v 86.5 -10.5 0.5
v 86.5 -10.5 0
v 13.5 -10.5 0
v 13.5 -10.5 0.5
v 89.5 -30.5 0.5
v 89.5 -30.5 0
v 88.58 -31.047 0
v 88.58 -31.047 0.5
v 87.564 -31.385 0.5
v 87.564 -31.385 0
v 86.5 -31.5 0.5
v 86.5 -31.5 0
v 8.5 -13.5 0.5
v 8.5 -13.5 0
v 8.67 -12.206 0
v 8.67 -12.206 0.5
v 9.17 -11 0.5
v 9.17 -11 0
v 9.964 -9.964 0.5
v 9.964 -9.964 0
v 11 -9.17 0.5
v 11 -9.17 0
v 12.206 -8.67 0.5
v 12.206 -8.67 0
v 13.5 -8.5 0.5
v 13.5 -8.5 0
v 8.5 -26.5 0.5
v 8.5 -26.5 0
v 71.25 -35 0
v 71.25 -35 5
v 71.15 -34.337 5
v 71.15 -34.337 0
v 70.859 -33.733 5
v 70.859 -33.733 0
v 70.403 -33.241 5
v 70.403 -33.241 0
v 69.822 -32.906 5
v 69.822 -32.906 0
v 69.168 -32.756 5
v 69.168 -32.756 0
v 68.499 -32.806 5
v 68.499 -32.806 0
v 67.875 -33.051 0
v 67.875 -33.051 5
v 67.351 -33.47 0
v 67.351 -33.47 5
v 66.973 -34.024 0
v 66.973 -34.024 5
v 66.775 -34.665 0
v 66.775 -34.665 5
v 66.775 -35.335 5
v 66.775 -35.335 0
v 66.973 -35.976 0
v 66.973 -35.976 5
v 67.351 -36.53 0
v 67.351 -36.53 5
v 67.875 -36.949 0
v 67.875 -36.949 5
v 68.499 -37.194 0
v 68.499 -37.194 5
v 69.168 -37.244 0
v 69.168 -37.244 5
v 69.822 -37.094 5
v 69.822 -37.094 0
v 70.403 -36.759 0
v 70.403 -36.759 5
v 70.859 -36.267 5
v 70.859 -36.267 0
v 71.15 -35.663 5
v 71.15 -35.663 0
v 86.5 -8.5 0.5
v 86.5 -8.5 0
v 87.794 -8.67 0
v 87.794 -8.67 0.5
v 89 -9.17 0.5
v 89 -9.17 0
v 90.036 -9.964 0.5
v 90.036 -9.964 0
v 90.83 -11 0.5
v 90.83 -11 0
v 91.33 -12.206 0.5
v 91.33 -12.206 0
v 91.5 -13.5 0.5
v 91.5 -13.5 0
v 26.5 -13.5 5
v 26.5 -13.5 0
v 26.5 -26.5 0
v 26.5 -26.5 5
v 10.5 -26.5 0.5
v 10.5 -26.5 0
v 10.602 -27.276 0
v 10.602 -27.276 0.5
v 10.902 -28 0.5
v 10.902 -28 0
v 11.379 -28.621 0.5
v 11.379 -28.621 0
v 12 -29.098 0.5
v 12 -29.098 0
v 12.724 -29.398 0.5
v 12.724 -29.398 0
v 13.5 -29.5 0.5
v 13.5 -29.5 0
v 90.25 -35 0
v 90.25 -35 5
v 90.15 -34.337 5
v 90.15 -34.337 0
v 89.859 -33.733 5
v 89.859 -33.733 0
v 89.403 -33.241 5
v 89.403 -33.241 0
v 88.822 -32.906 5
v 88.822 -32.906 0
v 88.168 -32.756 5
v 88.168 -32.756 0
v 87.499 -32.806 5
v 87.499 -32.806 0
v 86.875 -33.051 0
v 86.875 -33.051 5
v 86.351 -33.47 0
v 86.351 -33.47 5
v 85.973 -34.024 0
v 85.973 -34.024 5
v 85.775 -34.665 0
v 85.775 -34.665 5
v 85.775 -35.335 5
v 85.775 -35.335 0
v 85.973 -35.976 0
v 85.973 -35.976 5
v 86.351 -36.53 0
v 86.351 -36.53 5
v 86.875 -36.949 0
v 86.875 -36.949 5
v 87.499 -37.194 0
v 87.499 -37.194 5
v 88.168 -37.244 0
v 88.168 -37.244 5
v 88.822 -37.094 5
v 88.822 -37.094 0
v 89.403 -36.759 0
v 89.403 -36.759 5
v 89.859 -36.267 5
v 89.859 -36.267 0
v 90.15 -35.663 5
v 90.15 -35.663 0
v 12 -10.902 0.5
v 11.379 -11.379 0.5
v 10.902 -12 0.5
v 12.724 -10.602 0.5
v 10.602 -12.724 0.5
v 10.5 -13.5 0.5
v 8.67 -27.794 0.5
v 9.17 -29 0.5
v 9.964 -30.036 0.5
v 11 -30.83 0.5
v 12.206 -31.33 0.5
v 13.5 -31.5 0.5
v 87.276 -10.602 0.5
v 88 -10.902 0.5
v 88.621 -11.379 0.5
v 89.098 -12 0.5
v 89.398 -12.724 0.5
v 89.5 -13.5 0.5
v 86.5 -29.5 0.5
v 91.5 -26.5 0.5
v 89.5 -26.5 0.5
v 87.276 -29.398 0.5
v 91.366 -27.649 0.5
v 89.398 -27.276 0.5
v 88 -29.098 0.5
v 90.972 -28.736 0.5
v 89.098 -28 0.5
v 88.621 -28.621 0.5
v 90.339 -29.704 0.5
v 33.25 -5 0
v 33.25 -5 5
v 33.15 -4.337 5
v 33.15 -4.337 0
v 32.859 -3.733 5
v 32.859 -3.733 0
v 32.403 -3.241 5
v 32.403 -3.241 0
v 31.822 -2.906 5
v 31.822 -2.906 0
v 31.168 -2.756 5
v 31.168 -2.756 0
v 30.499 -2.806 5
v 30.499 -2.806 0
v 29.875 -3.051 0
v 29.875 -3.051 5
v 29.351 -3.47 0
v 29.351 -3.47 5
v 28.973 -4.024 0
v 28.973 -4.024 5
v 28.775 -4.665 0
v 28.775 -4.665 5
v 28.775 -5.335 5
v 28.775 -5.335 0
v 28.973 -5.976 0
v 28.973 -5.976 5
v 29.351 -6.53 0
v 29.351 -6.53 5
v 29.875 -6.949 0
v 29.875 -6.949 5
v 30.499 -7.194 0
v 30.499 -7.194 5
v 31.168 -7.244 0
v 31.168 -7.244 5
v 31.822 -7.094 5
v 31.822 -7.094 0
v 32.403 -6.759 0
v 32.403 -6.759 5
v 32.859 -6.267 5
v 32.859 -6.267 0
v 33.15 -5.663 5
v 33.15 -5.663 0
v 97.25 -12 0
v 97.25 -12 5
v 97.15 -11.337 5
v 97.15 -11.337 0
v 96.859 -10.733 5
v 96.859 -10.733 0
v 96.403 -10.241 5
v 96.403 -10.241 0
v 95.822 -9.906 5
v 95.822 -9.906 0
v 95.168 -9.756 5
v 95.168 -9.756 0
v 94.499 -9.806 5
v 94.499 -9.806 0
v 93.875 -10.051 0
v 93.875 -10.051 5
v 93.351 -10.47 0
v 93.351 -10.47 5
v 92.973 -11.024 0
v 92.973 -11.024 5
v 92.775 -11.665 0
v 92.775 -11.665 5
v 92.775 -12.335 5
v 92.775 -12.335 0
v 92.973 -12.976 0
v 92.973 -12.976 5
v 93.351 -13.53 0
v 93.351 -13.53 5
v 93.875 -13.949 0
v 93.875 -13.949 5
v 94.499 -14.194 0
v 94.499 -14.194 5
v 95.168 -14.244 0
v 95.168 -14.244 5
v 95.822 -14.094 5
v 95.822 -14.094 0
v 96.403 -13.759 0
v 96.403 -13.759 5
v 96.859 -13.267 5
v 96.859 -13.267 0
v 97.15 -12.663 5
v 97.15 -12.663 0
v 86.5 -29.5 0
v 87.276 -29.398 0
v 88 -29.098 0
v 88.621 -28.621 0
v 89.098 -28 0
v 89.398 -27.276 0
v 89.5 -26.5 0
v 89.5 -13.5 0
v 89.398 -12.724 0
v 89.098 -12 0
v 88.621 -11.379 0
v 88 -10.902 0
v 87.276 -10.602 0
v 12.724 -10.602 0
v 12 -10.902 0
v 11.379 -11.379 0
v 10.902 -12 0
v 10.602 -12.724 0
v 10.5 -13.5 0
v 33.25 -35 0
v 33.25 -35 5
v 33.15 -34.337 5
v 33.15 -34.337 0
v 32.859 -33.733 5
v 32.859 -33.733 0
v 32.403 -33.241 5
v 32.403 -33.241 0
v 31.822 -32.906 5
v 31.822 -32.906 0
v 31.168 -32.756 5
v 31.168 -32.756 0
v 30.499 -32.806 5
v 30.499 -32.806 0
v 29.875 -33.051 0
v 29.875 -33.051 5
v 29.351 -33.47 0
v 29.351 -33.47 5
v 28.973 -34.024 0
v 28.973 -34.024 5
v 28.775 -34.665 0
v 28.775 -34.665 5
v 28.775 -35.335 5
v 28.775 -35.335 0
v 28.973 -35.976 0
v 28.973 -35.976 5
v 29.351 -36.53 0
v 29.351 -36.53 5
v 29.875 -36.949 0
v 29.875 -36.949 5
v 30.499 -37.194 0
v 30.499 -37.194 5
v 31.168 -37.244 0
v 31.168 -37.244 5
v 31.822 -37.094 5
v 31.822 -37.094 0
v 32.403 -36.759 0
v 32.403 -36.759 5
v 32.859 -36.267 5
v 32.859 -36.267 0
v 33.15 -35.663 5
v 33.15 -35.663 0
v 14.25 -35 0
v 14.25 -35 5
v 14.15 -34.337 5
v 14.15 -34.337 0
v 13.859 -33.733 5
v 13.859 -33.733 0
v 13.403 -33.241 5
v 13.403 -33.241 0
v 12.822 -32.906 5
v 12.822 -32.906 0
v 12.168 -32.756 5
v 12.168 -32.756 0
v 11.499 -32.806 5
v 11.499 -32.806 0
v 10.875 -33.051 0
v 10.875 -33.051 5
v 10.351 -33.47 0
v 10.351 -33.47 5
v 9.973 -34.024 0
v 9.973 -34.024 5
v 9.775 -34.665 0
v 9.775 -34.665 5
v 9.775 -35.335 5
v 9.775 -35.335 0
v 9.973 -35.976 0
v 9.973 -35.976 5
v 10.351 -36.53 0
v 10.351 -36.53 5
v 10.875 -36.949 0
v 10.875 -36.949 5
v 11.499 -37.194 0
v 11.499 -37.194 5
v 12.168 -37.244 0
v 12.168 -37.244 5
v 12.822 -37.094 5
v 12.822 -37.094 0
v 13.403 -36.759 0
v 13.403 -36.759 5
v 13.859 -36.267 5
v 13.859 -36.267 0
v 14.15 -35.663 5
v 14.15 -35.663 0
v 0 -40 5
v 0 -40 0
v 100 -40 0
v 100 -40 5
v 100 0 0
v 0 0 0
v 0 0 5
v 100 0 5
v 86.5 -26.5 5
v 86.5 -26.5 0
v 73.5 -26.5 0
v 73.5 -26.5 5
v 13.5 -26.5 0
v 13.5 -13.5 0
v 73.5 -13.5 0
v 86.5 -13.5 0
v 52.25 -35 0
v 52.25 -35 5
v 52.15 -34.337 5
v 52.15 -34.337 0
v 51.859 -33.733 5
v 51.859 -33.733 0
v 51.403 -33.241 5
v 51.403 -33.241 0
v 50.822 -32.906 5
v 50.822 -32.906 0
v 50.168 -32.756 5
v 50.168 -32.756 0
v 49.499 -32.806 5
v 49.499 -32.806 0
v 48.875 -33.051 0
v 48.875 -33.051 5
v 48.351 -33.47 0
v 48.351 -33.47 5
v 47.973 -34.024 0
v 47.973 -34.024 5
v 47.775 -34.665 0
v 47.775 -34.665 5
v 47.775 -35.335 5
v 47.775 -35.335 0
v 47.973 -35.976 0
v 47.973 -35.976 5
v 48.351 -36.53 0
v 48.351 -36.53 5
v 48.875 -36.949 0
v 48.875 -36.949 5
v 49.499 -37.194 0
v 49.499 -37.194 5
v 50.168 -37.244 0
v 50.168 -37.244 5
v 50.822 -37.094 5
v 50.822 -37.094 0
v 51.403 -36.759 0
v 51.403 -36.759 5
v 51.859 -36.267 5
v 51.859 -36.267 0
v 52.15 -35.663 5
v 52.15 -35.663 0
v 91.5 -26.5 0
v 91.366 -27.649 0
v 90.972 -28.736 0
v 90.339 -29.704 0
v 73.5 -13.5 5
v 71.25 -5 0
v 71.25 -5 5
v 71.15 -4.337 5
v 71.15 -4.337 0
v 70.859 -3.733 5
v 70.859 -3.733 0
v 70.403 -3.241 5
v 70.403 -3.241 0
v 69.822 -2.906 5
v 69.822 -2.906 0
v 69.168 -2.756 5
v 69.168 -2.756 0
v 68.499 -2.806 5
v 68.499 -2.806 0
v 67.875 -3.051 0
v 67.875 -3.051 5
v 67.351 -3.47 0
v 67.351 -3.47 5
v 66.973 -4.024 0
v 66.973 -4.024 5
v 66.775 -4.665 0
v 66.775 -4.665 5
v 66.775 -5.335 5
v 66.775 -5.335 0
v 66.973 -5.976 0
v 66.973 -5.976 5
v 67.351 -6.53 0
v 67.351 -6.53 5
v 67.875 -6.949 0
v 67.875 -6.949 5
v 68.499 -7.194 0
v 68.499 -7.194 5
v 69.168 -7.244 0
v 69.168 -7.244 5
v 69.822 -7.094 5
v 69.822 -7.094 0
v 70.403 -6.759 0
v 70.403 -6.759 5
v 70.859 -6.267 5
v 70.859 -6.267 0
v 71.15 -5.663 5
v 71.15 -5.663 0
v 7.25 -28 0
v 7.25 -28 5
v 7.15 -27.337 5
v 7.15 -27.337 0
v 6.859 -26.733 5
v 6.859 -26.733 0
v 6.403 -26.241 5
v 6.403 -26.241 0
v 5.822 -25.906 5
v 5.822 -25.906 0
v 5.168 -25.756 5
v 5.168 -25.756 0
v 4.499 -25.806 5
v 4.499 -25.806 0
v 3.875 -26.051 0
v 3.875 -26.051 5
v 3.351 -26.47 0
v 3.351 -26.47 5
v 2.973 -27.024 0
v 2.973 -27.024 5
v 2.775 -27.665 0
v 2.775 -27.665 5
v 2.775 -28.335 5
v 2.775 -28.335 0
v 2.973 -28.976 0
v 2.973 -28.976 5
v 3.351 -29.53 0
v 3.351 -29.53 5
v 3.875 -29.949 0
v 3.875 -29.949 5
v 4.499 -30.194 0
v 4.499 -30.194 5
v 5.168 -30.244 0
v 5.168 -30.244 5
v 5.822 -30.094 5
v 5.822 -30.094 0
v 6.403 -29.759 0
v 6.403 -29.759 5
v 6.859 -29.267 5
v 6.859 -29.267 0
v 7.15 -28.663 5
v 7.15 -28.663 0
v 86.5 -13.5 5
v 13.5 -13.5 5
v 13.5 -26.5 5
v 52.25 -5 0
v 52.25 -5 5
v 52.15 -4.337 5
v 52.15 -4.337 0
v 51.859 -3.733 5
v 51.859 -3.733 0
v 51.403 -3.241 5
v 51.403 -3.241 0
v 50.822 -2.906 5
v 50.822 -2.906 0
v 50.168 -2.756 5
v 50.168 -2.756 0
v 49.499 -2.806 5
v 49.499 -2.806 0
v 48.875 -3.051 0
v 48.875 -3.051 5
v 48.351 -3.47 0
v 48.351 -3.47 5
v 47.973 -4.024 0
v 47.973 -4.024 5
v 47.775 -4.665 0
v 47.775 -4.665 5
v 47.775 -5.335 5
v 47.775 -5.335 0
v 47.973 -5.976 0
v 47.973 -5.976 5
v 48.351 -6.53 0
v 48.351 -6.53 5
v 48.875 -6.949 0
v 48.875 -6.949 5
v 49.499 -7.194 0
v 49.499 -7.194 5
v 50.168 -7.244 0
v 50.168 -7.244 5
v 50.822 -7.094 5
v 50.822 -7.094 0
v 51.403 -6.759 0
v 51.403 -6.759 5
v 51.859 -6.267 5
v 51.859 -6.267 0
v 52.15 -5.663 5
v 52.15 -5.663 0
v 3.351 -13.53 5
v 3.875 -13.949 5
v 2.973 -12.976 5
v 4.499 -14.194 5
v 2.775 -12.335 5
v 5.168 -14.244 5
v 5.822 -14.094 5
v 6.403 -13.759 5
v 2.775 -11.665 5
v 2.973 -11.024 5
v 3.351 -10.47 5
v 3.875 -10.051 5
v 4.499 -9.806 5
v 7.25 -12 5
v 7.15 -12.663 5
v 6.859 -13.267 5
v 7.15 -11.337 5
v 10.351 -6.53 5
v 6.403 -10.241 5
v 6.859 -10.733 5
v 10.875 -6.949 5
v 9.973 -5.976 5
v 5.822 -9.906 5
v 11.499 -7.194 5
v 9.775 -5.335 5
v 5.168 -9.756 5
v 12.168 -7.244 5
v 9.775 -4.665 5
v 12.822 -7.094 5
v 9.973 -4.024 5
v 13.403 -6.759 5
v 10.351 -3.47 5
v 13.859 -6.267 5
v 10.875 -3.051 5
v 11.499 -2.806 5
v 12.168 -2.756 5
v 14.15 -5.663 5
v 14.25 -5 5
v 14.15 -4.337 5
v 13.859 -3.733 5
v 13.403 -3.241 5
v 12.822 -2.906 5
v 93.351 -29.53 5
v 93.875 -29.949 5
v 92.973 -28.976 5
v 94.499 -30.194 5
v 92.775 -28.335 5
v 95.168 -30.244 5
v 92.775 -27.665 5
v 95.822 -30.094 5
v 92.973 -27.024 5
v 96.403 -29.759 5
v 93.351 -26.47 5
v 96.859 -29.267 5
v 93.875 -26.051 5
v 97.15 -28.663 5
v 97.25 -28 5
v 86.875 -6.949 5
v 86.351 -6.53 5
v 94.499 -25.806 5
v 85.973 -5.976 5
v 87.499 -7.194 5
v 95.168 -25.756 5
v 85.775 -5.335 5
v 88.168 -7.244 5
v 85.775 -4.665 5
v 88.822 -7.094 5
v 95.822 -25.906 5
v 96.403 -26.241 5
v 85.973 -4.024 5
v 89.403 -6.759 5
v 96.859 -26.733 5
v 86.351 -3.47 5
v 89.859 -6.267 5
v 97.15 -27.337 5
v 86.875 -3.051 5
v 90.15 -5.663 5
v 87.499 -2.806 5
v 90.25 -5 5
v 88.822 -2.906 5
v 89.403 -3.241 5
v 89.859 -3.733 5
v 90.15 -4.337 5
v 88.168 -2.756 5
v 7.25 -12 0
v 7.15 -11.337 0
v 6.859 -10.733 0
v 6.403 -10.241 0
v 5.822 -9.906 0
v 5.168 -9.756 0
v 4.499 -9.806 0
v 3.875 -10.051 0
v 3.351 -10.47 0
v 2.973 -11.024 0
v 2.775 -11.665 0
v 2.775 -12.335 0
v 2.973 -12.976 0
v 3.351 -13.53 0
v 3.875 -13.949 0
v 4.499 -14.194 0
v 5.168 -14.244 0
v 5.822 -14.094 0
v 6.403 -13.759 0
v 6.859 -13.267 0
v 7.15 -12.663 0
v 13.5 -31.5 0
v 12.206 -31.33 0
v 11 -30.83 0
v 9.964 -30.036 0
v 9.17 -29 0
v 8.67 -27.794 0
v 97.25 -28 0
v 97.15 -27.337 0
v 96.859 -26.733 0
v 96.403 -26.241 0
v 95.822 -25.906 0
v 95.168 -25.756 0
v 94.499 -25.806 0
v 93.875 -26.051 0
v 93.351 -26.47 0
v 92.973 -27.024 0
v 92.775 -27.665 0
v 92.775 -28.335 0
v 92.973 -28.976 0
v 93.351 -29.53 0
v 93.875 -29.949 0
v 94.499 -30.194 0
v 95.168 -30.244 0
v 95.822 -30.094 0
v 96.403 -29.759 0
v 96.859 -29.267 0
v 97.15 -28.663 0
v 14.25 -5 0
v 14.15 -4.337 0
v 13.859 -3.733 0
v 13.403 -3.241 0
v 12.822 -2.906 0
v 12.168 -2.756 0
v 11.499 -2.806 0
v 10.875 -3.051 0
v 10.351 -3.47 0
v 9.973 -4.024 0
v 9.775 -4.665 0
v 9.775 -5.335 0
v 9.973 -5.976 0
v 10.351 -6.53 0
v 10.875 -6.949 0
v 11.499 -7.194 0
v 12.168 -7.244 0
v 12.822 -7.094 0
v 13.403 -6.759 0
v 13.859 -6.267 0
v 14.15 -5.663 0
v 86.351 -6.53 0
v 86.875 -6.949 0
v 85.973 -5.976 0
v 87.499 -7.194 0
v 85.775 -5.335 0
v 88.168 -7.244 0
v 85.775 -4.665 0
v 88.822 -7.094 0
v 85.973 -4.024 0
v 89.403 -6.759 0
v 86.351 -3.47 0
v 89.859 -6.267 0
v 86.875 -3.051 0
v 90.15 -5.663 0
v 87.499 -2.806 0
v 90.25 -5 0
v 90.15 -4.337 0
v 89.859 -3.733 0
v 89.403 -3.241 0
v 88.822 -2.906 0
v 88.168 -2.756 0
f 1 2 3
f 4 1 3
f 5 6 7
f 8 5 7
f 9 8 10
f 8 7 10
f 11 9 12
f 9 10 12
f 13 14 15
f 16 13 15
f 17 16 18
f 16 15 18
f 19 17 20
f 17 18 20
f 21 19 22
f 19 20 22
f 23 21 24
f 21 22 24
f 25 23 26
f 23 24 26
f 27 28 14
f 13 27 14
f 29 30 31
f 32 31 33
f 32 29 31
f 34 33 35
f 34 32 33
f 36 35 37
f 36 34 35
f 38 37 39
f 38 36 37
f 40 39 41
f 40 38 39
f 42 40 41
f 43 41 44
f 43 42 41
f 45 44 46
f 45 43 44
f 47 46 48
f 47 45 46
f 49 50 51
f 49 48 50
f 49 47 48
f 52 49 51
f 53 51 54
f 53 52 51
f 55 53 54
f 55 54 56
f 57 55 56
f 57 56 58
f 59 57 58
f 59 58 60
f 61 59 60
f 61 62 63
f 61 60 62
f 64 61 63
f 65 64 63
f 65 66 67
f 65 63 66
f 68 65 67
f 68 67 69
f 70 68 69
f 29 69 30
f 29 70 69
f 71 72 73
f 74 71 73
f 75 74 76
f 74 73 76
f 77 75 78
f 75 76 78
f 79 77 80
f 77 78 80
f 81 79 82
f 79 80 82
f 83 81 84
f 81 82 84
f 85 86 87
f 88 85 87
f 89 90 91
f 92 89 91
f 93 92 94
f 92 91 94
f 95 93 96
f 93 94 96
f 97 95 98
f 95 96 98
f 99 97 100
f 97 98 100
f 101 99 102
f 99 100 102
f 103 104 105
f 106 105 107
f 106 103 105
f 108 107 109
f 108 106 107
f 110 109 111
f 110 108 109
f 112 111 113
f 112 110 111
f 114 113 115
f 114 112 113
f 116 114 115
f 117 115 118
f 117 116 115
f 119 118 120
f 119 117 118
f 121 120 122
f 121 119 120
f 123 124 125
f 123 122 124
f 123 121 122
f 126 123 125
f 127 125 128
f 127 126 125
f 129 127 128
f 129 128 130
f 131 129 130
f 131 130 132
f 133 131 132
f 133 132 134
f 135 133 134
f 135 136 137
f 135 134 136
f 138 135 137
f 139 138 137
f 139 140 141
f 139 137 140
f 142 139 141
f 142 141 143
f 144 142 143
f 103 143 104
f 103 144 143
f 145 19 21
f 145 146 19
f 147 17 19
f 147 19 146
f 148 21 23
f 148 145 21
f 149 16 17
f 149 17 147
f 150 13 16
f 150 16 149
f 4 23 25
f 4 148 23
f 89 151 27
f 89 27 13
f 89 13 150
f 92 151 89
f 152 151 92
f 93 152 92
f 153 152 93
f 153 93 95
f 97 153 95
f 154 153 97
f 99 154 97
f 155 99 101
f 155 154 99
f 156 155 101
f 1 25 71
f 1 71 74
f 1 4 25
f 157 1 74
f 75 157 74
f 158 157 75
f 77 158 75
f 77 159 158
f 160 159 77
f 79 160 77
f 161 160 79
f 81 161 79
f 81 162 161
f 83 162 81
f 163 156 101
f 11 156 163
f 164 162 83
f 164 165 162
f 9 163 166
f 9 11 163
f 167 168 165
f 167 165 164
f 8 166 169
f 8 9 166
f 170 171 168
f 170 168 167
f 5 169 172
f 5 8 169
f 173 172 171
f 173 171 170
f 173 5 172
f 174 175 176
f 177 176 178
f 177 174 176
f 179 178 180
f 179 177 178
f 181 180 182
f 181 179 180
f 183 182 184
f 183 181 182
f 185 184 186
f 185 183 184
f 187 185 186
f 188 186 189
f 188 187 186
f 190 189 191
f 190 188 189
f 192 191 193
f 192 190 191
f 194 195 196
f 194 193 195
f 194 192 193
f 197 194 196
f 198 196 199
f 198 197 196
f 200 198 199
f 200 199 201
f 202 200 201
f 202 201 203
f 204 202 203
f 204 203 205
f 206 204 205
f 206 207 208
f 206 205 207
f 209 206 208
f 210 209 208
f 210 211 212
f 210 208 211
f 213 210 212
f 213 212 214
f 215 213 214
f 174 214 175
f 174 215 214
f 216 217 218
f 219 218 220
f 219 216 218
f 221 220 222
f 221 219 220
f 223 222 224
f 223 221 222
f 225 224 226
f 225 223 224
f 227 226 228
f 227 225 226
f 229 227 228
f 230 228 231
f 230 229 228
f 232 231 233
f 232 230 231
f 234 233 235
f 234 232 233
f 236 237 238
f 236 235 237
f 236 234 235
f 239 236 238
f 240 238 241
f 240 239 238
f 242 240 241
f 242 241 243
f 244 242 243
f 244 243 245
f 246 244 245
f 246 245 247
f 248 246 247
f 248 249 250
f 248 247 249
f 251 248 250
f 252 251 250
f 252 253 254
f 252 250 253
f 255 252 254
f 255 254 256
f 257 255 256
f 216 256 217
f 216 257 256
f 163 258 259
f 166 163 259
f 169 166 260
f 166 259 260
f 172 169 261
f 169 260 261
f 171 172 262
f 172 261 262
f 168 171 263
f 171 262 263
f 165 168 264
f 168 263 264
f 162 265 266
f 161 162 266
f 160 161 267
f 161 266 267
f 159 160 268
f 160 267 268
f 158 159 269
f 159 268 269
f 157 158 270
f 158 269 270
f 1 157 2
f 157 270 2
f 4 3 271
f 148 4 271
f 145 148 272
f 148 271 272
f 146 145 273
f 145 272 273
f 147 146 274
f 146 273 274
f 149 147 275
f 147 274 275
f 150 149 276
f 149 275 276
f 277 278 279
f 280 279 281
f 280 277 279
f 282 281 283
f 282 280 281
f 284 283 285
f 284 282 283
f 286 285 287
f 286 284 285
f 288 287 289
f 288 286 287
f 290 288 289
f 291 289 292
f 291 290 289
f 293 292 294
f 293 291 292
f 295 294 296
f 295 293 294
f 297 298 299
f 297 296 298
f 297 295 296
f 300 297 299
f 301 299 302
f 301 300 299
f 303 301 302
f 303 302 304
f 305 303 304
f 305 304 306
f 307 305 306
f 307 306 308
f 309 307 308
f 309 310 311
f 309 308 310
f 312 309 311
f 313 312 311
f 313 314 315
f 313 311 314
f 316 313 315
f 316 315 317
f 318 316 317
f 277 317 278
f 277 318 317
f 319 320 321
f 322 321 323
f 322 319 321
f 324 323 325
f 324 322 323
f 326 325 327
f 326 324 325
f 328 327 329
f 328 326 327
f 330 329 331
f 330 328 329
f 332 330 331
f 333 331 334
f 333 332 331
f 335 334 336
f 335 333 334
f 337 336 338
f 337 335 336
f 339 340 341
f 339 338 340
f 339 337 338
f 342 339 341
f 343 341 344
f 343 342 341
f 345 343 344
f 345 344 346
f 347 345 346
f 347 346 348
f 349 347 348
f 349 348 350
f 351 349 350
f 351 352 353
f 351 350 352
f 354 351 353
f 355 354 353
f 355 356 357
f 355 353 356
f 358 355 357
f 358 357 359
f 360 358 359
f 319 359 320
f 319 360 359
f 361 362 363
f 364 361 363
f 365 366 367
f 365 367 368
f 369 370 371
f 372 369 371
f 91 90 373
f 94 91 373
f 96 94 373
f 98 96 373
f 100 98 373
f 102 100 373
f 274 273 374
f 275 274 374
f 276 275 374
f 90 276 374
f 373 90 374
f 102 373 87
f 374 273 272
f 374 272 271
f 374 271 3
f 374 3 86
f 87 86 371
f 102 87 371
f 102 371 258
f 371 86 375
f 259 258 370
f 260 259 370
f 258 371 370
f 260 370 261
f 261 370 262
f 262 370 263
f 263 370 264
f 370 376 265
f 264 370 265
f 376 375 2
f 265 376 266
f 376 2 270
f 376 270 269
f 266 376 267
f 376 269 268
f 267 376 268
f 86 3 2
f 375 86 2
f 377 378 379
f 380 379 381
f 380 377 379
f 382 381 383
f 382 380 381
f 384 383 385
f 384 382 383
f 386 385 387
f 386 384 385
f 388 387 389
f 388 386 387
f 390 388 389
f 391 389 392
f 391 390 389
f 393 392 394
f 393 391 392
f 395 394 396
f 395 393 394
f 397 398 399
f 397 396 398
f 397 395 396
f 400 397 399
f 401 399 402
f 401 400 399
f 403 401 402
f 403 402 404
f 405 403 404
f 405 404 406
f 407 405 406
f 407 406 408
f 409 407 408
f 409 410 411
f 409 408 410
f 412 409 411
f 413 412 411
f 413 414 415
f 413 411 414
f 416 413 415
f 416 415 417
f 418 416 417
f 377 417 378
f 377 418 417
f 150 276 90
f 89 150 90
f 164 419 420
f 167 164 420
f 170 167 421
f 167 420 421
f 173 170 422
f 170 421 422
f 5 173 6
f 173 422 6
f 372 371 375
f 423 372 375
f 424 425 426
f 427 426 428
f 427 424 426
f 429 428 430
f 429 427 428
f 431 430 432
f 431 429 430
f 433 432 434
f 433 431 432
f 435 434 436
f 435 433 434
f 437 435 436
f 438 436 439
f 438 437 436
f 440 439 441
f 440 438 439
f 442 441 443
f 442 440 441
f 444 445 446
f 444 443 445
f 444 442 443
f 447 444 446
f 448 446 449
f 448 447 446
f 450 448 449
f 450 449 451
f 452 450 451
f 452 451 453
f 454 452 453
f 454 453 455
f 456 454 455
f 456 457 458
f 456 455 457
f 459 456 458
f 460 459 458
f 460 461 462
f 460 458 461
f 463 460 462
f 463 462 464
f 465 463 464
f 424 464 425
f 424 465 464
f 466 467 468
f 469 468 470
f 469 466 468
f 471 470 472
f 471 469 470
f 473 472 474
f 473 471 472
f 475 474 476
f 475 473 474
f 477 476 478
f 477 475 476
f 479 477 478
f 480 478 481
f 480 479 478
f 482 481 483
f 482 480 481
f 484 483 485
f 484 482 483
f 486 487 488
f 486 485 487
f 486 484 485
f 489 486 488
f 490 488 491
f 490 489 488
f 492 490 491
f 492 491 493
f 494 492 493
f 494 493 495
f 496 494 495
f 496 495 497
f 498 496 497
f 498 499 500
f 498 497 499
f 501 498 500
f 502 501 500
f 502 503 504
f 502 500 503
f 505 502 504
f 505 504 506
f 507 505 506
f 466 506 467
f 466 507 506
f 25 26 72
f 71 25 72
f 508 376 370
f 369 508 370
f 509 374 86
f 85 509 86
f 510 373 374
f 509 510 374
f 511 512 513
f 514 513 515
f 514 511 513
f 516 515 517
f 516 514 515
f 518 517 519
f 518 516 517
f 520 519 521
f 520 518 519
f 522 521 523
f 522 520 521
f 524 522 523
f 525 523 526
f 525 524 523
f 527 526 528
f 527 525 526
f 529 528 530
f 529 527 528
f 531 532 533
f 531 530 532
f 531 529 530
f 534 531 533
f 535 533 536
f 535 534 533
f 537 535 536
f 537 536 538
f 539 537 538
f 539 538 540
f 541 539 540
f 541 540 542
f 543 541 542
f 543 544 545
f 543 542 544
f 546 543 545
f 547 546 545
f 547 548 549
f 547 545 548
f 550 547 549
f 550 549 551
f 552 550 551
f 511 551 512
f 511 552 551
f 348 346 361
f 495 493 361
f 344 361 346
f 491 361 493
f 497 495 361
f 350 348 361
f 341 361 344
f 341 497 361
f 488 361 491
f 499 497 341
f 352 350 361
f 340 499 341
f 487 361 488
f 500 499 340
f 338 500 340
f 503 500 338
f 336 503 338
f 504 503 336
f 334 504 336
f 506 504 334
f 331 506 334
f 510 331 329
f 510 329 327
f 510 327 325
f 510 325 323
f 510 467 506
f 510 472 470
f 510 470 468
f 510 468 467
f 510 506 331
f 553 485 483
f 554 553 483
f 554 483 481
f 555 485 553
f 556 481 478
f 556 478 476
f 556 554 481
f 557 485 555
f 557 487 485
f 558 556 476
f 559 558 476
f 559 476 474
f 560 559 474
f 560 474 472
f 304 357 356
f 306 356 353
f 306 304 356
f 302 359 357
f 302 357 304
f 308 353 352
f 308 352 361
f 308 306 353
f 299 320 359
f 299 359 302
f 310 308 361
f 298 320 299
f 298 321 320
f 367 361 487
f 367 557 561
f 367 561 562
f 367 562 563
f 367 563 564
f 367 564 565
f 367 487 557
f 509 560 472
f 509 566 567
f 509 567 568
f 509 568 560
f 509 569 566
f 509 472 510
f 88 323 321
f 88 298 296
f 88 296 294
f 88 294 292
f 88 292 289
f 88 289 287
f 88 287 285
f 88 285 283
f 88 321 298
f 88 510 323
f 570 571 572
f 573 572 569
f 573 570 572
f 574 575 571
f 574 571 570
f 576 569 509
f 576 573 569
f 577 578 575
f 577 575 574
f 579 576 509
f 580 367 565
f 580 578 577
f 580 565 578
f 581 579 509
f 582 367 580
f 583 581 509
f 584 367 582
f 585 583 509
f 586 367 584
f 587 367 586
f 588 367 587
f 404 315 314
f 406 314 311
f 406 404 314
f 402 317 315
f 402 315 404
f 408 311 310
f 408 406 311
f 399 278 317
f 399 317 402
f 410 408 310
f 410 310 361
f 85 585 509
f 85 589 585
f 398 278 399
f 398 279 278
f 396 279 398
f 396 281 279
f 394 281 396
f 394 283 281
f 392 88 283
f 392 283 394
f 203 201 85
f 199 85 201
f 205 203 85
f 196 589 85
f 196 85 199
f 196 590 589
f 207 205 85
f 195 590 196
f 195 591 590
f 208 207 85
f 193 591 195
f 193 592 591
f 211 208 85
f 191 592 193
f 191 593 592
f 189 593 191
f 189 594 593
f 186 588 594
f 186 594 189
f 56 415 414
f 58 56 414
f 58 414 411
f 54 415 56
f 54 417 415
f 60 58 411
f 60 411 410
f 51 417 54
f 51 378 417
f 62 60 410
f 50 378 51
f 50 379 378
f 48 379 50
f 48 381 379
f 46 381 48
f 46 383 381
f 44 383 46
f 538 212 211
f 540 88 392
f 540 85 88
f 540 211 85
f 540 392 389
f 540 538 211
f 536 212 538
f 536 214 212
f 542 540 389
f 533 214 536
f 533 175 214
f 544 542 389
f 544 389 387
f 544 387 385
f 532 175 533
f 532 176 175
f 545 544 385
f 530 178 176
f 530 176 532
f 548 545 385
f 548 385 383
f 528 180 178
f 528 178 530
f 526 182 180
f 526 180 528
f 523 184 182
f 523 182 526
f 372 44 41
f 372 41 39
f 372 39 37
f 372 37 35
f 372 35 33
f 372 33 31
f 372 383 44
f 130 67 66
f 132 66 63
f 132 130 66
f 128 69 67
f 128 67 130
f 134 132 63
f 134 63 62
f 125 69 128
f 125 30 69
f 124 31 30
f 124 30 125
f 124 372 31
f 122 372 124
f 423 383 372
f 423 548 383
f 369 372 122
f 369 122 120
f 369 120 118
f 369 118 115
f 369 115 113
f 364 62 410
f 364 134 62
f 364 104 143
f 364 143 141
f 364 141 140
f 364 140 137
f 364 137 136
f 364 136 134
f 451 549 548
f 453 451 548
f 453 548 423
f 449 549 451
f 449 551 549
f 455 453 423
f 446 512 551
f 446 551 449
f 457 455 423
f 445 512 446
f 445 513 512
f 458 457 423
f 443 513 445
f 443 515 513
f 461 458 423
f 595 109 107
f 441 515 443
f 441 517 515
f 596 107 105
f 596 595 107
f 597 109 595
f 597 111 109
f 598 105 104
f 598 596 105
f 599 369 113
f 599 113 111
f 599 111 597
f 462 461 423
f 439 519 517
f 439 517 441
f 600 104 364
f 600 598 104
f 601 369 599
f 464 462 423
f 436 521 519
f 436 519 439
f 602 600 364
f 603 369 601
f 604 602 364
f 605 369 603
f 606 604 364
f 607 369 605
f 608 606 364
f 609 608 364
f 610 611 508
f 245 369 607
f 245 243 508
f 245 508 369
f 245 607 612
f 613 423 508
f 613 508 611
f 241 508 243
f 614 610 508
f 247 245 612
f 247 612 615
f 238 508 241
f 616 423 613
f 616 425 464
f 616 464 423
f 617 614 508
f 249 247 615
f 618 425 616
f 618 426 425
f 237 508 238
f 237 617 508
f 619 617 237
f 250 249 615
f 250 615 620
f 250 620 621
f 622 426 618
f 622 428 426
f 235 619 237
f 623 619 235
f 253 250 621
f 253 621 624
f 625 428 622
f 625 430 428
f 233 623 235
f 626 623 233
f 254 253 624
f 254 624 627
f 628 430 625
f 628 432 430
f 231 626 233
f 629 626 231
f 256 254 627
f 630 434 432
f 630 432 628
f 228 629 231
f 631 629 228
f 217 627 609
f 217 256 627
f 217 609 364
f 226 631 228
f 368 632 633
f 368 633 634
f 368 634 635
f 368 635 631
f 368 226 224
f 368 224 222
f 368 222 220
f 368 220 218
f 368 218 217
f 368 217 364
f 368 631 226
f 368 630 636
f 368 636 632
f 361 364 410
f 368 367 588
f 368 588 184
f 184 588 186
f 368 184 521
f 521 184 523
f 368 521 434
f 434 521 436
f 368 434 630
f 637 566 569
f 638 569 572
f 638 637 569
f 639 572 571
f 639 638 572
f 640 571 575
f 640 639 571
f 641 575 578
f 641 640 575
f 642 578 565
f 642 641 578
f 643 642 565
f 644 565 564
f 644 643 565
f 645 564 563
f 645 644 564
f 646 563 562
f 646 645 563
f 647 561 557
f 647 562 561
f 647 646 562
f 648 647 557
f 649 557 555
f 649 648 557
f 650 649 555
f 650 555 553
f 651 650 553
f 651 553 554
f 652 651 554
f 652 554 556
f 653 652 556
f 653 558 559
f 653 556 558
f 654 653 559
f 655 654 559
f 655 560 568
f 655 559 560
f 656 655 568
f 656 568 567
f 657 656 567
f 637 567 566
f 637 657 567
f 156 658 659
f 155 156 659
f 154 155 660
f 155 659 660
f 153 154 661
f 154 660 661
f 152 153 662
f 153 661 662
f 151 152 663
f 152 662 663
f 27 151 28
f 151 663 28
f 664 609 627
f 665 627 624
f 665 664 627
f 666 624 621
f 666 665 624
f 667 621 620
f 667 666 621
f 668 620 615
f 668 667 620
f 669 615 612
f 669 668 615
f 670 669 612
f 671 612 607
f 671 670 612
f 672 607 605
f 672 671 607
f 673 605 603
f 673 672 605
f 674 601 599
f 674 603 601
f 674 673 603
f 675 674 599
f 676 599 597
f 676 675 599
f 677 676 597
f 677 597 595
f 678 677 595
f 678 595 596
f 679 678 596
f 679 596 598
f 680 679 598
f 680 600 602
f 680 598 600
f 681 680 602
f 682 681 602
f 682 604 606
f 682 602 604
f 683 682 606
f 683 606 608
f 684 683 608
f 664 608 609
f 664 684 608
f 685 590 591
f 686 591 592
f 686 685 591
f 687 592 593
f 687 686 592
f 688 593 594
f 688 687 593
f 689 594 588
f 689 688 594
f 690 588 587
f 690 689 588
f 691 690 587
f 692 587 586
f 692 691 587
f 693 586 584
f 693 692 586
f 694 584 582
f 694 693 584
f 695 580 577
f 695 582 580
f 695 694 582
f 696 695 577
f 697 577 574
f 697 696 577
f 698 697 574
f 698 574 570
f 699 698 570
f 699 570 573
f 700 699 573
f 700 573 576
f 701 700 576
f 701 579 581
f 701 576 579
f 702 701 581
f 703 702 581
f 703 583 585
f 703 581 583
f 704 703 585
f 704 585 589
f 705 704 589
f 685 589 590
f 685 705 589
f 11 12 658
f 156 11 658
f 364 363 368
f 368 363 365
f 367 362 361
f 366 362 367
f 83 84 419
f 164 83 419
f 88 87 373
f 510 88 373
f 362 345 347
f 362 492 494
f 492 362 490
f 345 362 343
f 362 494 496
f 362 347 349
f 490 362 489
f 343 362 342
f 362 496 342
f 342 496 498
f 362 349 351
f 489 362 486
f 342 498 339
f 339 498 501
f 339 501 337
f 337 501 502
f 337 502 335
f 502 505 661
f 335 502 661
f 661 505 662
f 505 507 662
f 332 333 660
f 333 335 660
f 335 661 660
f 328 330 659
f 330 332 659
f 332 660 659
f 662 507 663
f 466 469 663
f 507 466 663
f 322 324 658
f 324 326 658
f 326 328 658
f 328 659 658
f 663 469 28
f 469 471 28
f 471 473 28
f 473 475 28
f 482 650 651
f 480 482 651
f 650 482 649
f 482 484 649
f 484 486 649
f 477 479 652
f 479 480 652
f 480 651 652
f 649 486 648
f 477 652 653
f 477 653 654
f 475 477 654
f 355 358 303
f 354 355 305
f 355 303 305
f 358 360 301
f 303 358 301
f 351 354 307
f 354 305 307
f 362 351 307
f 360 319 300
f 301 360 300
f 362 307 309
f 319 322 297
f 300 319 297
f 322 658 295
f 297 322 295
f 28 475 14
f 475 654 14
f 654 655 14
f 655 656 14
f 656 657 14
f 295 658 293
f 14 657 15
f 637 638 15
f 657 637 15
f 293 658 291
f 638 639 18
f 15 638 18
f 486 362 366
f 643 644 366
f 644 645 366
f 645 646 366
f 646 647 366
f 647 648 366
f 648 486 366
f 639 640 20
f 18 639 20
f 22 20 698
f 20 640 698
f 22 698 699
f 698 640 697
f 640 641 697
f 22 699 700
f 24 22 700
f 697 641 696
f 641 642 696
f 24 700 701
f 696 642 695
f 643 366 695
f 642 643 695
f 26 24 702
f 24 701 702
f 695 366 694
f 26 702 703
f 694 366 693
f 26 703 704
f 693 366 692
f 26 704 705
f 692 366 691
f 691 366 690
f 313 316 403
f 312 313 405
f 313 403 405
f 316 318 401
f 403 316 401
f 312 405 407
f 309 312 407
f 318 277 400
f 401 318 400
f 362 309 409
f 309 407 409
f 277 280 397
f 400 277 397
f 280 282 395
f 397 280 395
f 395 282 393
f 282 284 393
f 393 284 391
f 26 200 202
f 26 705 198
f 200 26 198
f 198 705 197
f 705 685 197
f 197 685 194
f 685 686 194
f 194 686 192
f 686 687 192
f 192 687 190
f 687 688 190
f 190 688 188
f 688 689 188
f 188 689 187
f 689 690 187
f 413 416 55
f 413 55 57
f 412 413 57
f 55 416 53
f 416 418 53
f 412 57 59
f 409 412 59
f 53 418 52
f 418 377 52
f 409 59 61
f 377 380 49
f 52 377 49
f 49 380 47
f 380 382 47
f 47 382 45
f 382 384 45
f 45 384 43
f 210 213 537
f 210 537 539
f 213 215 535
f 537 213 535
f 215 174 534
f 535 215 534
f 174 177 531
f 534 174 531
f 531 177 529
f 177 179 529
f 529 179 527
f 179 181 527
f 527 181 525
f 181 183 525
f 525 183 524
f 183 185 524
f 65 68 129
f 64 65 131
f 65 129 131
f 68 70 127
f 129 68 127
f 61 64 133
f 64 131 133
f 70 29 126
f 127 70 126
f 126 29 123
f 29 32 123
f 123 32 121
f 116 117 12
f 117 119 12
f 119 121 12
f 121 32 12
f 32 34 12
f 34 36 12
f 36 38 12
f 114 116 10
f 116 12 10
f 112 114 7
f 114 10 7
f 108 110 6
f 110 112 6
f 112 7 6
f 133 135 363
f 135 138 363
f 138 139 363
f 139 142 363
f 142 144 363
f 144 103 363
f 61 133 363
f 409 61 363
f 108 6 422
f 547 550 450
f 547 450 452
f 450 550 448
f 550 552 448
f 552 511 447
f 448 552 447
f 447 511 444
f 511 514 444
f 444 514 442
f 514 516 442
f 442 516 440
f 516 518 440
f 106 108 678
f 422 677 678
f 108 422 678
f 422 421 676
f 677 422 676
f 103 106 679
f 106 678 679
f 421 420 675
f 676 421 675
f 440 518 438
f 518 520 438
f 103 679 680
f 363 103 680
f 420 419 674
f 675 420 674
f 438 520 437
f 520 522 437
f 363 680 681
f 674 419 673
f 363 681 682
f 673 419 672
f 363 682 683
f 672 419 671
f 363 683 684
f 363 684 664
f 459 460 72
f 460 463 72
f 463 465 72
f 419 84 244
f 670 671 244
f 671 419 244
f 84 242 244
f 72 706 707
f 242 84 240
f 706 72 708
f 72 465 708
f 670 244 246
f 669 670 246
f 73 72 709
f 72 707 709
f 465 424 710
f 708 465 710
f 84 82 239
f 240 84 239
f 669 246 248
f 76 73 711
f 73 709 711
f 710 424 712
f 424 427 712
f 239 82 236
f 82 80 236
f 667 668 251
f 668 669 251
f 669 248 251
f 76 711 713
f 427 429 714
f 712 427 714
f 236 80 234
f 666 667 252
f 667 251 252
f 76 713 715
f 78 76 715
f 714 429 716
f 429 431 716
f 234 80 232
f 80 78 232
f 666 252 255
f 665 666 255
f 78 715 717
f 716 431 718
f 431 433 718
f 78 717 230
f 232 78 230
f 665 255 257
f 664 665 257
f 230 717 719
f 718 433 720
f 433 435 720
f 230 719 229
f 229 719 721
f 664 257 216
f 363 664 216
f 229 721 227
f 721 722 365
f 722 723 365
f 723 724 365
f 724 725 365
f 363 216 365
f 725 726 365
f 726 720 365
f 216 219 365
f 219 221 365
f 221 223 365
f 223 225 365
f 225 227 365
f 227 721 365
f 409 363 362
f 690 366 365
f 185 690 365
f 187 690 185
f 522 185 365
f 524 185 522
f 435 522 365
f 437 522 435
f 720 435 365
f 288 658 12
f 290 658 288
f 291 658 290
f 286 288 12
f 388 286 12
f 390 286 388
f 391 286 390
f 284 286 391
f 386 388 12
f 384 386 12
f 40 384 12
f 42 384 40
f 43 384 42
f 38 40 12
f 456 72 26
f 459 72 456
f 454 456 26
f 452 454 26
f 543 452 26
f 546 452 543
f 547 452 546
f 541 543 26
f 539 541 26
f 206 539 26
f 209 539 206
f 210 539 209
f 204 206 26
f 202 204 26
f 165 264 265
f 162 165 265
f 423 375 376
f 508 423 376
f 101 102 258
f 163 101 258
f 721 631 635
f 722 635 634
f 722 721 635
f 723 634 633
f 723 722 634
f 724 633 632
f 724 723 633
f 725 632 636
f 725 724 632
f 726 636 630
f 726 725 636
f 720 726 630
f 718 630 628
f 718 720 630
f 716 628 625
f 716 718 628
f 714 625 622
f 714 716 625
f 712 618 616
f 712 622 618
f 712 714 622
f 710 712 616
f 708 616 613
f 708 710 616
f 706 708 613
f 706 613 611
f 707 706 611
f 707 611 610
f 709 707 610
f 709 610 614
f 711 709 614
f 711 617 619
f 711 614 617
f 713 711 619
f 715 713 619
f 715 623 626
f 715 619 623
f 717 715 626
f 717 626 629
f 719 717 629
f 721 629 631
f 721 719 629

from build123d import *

# Parameters (mm, degrees)
F0_W     = 100
F0_H     = 40
F1_DEPTH = 5
F2_R     = 2.25
F3_DEPTH = 18.9
F5_DEPTH = 0.5
F7_DEPTH = 5


with BuildPart() as f1:
    # F0 (on Top) → F1 (new body)
    with BuildSketch(Plane.XY):
        with Locations((50, -20)):
            Rectangle(F0_W, F0_H)
    extrude(amount=F1_DEPTH)

    # F2 (on Top) → F3 (cut)
    with BuildSketch(Plane.XY):
        with Locations((12, -35)):
            Circle(F2_R)
        with Locations((31, -35)):
            Circle(F2_R)
        with Locations((50, -35)):
            Circle(F2_R)
        with Locations((69, -35)):
            Circle(F2_R)
        with Locations((88, -35)):
            Circle(F2_R)
        with Locations((95, -28)):
            Circle(F2_R)
        with Locations((95, -12)):
            Circle(F2_R)
        with Locations((88, -5)):
            Circle(F2_R)
        with Locations((69, -5)):
            Circle(F2_R)
        with Locations((50, -5)):
            Circle(F2_R)
        with Locations((31, -5)):
            Circle(F2_R)
        with Locations((12, -5)):
            Circle(F2_R)
        with Locations((5, -12)):
            Circle(F2_R)
        with Locations((5, -28)):
            Circle(F2_R)
    extrude(amount=F3_DEPTH, mode=Mode.SUBTRACT)

    # F4 (on face) → F5 (cut)
    with BuildSketch(Plane(origin=(0, 0, 0), x_dir=(1, 0, 0), z_dir=(0, 0, -1))):
        with BuildLine():
            ThreePointArc((91.5, 26.5), (90.972136, 28.736068), (89.5, 30.5))
            ThreePointArc((89.5, 30.5), (88.081139, 31.243416), (86.5, 31.5))
            Line((86.5, 31.5), (13.5, 31.5))
            ThreePointArc((13.5, 31.5), (9.964466, 30.035534), (8.5, 26.5))
            Line((8.5, 26.5), (8.5, 13.5))
            ThreePointArc((8.5, 13.5), (9.964466, 9.964466), (13.5, 8.5))
            Line((13.5, 8.5), (86.5, 8.5))
            ThreePointArc((86.5, 8.5), (90.035534, 9.964466), (91.5, 13.5))
            Line((91.5, 13.5), (91.5, 26.5))
        make_face()
        with BuildLine():
            ThreePointArc((10.5, 26.5), (11.37868, 28.62132), (13.5, 29.5))
            Line((13.5, 29.5), (86.5, 29.5))
            ThreePointArc((86.5, 29.5), (88.62132, 28.62132), (89.5, 26.5))
            Line((89.5, 26.5), (89.5, 13.5))
            ThreePointArc((89.5, 13.5), (88.62132, 11.37868), (86.5, 10.5))
            Line((86.5, 10.5), (13.5, 10.5))
            ThreePointArc((13.5, 10.5), (11.37868, 11.37868), (10.5, 13.5))
            Line((10.5, 13.5), (10.5, 26.5))
        make_face(mode=Mode.SUBTRACT)
    extrude(amount=-F5_DEPTH, mode=Mode.SUBTRACT)

    # F6 (on face) → F7 (cut)
    with BuildSketch(Plane(origin=(0, 0, 0), x_dir=(1, 0, 0), z_dir=(0, 0, -1))):
        Polygon((85, 13.5), (86.5, 13.5), (86.5, 26.5), (73.5, 26.5), (73.5, 13.5), (84, 13.5), align=None)
        Polygon((26.5, 13.5), (26.5, 26.5), (13.5, 26.5), (13.5, 13.5), (16, 13.5), align=None)
    extrude(amount=-F7_DEPTH, mode=Mode.SUBTRACT)


solid = f1.part
